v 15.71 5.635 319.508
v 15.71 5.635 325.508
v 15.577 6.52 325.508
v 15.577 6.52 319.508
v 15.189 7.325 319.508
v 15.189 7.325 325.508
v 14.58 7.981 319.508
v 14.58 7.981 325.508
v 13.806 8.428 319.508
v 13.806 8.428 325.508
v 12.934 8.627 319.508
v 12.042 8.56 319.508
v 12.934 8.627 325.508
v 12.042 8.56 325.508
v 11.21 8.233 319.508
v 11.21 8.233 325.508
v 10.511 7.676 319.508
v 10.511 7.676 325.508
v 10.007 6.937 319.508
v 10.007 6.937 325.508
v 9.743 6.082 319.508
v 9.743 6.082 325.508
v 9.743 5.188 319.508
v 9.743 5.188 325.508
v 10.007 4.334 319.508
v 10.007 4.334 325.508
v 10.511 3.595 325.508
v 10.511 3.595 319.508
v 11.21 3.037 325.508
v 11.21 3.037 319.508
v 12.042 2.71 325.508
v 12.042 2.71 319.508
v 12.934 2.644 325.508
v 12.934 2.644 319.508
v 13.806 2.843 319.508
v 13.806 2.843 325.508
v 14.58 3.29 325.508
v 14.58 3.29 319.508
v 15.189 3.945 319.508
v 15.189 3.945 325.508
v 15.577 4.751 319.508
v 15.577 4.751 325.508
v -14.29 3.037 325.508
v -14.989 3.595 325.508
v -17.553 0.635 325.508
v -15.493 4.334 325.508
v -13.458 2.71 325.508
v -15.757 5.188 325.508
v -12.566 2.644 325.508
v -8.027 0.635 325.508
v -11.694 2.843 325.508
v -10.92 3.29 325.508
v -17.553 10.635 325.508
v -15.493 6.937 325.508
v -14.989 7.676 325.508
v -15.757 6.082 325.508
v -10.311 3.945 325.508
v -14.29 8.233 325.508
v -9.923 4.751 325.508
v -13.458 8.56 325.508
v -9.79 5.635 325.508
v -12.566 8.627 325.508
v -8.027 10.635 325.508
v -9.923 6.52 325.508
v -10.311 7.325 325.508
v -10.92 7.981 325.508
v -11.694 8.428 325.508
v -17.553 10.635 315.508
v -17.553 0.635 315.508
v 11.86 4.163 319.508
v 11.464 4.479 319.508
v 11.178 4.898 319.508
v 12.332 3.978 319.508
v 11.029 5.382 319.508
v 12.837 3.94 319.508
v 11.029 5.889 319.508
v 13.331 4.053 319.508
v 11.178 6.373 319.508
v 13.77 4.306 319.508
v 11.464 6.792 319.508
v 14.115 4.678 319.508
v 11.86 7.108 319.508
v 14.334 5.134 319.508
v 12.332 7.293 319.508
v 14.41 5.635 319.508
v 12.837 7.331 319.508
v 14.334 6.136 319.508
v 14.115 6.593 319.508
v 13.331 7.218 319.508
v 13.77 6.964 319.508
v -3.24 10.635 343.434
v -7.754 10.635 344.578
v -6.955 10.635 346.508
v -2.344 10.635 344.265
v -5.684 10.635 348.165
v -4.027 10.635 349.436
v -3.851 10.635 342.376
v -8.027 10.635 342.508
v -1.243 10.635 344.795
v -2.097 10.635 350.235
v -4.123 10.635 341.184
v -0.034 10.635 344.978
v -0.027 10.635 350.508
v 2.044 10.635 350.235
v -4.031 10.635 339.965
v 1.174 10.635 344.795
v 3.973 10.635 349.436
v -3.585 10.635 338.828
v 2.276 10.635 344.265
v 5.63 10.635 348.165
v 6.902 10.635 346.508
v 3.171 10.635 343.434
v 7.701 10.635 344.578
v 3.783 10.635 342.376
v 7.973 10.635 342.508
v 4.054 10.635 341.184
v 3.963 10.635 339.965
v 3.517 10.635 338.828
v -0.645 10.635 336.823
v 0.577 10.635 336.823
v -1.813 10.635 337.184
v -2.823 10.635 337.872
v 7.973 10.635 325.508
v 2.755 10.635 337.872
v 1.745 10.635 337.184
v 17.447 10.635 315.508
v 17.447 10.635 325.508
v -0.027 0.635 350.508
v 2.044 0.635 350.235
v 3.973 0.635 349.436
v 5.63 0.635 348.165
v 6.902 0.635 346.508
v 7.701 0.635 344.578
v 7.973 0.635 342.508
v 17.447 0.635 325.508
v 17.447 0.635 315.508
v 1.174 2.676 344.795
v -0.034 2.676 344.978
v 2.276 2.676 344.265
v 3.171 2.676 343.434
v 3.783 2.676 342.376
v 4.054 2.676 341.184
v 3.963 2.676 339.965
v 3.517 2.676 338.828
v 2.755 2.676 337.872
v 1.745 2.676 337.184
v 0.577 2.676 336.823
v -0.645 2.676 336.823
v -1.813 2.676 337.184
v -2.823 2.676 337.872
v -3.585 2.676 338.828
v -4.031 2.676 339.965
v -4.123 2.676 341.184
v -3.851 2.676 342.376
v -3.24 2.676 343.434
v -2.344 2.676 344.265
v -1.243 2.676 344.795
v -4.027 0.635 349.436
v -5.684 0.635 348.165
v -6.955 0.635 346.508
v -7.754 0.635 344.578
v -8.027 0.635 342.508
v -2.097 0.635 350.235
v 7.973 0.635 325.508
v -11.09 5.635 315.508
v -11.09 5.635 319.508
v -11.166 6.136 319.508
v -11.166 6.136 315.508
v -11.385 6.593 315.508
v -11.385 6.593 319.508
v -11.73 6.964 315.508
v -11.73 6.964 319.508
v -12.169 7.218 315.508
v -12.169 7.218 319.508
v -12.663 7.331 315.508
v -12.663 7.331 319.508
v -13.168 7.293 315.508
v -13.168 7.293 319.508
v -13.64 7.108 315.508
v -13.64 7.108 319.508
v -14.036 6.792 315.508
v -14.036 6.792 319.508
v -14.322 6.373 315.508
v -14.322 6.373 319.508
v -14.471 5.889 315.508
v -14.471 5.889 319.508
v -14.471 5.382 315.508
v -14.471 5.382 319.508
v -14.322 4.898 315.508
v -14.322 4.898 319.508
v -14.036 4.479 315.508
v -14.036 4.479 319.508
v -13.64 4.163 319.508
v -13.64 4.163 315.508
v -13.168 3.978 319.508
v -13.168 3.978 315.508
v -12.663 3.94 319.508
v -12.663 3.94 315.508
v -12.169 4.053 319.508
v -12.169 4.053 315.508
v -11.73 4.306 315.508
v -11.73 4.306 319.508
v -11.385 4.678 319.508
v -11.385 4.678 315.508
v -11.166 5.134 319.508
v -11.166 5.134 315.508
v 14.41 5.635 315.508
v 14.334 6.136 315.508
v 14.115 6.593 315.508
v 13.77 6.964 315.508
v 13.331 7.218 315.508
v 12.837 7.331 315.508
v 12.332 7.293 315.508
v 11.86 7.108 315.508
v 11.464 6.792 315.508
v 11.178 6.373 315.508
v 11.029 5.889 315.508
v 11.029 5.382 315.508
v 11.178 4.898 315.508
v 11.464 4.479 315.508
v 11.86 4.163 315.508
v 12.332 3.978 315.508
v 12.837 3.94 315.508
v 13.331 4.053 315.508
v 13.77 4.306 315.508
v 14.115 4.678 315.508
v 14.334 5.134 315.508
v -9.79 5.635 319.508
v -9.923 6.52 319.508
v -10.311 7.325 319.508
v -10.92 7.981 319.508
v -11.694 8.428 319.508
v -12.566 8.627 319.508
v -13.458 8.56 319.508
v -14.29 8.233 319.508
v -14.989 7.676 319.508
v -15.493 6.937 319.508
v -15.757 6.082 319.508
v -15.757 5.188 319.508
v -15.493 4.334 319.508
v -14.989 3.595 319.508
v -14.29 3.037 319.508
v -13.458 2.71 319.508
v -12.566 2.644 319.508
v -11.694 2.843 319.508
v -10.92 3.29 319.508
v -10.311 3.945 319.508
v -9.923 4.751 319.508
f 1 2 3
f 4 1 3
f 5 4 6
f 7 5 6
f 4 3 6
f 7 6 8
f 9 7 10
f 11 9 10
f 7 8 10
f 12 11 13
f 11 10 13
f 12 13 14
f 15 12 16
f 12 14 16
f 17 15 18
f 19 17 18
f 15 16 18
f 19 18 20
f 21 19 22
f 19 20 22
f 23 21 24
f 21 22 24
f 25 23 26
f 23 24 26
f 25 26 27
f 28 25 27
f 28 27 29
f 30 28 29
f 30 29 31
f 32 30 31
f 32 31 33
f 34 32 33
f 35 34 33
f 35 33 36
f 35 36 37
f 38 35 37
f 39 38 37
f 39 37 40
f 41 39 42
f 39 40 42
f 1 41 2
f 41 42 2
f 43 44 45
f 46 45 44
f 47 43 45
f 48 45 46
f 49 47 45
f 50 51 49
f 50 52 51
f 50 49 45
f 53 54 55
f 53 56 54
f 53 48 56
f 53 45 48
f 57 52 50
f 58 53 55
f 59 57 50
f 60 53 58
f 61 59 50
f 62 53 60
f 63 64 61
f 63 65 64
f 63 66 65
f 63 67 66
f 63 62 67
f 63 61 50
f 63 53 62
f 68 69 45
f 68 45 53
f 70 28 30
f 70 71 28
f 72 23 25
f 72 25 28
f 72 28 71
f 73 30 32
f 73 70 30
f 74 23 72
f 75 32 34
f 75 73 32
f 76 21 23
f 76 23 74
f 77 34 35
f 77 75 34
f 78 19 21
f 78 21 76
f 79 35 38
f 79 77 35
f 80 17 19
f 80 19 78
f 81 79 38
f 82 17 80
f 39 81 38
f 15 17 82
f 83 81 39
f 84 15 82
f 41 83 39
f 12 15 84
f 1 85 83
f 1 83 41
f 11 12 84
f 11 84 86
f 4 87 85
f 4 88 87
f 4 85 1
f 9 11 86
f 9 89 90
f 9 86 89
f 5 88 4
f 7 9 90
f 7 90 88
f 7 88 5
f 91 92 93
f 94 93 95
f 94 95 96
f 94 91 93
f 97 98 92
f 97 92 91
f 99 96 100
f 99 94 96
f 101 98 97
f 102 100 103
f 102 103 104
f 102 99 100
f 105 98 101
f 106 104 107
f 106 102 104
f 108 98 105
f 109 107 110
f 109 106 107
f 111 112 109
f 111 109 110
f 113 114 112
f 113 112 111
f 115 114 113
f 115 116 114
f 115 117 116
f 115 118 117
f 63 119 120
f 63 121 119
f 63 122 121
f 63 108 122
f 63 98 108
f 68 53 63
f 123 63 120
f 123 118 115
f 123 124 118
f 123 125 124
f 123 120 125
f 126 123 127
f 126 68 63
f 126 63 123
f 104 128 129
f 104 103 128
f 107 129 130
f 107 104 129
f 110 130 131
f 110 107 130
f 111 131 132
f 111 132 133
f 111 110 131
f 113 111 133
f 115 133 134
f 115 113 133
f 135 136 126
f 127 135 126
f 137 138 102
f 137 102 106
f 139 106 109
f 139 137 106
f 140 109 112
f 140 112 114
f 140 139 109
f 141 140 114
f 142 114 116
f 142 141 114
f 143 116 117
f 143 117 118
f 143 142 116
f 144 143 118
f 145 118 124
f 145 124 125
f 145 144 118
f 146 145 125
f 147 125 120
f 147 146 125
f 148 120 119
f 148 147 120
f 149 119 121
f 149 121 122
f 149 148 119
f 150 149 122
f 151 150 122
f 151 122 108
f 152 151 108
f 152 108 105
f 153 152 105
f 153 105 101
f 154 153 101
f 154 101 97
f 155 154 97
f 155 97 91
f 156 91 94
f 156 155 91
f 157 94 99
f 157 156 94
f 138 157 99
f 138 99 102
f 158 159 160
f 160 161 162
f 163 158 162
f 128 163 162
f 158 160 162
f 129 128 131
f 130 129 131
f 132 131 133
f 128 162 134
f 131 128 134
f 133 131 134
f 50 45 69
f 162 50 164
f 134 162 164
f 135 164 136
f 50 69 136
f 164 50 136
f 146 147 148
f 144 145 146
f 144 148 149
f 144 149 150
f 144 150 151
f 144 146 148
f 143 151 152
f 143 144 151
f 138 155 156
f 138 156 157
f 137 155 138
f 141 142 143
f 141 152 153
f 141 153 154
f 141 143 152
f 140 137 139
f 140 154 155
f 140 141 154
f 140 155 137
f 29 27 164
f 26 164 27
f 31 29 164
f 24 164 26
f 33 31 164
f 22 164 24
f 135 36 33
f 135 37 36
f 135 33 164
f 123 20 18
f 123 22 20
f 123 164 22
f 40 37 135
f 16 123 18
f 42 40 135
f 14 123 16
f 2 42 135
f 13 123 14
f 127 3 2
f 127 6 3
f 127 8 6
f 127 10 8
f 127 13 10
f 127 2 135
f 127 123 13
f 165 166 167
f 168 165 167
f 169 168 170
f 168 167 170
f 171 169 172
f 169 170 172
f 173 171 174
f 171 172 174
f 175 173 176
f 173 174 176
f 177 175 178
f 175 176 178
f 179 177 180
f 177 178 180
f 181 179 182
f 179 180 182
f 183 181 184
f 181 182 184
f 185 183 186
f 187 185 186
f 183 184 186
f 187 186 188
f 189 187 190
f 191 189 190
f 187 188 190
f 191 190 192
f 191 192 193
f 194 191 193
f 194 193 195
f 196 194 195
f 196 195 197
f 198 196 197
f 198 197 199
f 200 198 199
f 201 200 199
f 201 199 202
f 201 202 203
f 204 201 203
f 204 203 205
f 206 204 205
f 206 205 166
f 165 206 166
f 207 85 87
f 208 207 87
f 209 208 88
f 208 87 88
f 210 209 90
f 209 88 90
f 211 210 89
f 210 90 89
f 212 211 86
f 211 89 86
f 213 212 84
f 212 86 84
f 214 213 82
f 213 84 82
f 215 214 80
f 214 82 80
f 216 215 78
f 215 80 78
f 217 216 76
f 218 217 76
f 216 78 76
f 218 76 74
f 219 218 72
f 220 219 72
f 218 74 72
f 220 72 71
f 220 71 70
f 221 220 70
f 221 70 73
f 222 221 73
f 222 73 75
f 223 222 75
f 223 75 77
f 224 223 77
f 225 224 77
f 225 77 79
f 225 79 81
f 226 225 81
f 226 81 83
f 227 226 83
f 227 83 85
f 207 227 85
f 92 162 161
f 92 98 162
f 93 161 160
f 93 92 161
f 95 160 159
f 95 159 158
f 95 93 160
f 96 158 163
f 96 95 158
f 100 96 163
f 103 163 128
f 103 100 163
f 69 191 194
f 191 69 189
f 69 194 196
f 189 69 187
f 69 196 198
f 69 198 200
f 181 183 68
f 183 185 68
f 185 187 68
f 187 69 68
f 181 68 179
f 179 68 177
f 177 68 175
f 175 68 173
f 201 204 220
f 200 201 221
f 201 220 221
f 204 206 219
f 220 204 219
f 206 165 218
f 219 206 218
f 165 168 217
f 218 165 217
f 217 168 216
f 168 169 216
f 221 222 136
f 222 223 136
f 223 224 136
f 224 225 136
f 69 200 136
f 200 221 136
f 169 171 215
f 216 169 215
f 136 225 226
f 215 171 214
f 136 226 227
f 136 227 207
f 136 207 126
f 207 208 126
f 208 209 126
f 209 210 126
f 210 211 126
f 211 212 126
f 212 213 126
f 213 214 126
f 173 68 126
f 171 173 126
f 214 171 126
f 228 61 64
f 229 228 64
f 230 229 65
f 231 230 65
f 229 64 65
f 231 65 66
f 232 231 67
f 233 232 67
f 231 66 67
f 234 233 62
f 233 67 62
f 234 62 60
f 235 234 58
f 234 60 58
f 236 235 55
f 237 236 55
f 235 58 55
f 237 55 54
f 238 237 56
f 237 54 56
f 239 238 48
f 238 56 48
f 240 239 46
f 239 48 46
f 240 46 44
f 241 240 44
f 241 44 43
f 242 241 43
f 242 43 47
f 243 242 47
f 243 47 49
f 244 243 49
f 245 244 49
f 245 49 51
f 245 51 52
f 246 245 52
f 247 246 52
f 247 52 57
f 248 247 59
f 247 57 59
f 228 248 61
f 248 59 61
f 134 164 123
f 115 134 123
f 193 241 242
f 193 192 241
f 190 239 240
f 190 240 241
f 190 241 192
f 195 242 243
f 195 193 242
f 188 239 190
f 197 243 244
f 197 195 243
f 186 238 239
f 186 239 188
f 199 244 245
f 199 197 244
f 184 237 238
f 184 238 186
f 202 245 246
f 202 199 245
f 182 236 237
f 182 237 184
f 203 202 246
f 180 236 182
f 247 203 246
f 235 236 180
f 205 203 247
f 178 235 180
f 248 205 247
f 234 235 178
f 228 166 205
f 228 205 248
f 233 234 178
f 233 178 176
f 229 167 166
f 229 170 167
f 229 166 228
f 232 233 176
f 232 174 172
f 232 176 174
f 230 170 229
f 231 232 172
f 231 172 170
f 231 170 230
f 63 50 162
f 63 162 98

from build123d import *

# Parameters (mm, degrees)
SKETCH1_W           = 35
SKETCH1_H           = 10
BOSS_EXTRUDE1_DEPTH = 10
SKETCH2_W           = 16
SKETCH2_H           = 10
BOSS_EXTRUDE2_DEPTH = 25
CUT_EXTRUDE3_START  = -7.959741
SKETCH3_R           = 4.1
CUT_EXTRUDE3_DEPTH  = 7.959741
SKETCH4_R           = 1.7
CUT_EXTRUDE4_DEPTH  = 13
SKETCH5_R           = 3
SKETCH5_R_2         = 1.7
CUT_EXTRUDE5_DEPTH  = 6
FILLET1_R           = 8


with BuildPart() as part:
    # Sketch1 → Boss-Extrude1 (new body)
    with BuildSketch(Plane.XY.offset(315.507646495)):
        with Locations((-0.05341426, 5.6352577)):
            Rectangle(SKETCH1_W, SKETCH1_H)
    extrude(amount=BOSS_EXTRUDE1_DEPTH)

    # Sketch2 → Boss-Extrude2 (add)
    with BuildSketch(Plane.XY.offset(325.507646495)):
        with Locations((-0.02670713, 5.6352577)):
            Rectangle(SKETCH2_W, SKETCH2_H)
    extrude(amount=BOSS_EXTRUDE2_DEPTH)

    # Sketch3 → Cut-Extrude3 (cut)
    with BuildSketch(Plane(origin=(0, 10.6352577, 0), x_dir=(1, 0, 0), z_dir=(0, 1, 0)).offset(CUT_EXTRUDE3_START)):
        with Locations(Location((-0.034055406, -340.877646495, 0), (0, 0, 270))):
            Circle(SKETCH3_R)
    extrude(amount=CUT_EXTRUDE3_DEPTH, mode=Mode.SUBTRACT)

    # Sketch4 → Cut-Extrude4 (cut)
    with BuildSketch(Plane.XY.offset(325.507646495)):
        with Locations((-12.790060695, 5.6352577)):
            Circle(SKETCH4_R)
        with Locations((12.709939305, 5.6352577)):
            Circle(SKETCH4_R)
    extrude(amount=-CUT_EXTRUDE4_DEPTH, mode=Mode.SUBTRACT)

    # Sketch5 → Cut-Extrude5 (cut)
    # profile 1 of 2: a face of its own
    with BuildSketch(Plane.XY.offset(325.507646495)):
        with Locations((-12.790060695, 5.6352577)):
            Circle(SKETCH5_R)
        with Locations((-12.790060695, 5.6352577)):
            Circle(SKETCH5_R_2, mode=Mode.SUBTRACT)
    # profile 2 of 2: a face of its own
    with BuildSketch(Plane.XY.offset(325.507646495)):
        with Locations((12.709939305, 5.6352577)):
            Circle(SKETCH5_R)
        with Locations((12.709939305, 5.6352577)):
            Circle(SKETCH5_R_2, mode=Mode.SUBTRACT)
    extrude(amount=-CUT_EXTRUDE5_DEPTH, mode=Mode.SUBTRACT)

    # Fillet1
    fillet1_edges = [part.edges().sort_by_distance(p)[0] for p in [
        (7.97329287, 5.6352577, 350.507646495),
        (-8.02670713, 5.6352577, 350.507646495),
    ]]
    fillet(fillet1_edges, radius=FILLET1_R - 0.0001)  # a hair under: the kernel refuses the full size


solid = part.part
